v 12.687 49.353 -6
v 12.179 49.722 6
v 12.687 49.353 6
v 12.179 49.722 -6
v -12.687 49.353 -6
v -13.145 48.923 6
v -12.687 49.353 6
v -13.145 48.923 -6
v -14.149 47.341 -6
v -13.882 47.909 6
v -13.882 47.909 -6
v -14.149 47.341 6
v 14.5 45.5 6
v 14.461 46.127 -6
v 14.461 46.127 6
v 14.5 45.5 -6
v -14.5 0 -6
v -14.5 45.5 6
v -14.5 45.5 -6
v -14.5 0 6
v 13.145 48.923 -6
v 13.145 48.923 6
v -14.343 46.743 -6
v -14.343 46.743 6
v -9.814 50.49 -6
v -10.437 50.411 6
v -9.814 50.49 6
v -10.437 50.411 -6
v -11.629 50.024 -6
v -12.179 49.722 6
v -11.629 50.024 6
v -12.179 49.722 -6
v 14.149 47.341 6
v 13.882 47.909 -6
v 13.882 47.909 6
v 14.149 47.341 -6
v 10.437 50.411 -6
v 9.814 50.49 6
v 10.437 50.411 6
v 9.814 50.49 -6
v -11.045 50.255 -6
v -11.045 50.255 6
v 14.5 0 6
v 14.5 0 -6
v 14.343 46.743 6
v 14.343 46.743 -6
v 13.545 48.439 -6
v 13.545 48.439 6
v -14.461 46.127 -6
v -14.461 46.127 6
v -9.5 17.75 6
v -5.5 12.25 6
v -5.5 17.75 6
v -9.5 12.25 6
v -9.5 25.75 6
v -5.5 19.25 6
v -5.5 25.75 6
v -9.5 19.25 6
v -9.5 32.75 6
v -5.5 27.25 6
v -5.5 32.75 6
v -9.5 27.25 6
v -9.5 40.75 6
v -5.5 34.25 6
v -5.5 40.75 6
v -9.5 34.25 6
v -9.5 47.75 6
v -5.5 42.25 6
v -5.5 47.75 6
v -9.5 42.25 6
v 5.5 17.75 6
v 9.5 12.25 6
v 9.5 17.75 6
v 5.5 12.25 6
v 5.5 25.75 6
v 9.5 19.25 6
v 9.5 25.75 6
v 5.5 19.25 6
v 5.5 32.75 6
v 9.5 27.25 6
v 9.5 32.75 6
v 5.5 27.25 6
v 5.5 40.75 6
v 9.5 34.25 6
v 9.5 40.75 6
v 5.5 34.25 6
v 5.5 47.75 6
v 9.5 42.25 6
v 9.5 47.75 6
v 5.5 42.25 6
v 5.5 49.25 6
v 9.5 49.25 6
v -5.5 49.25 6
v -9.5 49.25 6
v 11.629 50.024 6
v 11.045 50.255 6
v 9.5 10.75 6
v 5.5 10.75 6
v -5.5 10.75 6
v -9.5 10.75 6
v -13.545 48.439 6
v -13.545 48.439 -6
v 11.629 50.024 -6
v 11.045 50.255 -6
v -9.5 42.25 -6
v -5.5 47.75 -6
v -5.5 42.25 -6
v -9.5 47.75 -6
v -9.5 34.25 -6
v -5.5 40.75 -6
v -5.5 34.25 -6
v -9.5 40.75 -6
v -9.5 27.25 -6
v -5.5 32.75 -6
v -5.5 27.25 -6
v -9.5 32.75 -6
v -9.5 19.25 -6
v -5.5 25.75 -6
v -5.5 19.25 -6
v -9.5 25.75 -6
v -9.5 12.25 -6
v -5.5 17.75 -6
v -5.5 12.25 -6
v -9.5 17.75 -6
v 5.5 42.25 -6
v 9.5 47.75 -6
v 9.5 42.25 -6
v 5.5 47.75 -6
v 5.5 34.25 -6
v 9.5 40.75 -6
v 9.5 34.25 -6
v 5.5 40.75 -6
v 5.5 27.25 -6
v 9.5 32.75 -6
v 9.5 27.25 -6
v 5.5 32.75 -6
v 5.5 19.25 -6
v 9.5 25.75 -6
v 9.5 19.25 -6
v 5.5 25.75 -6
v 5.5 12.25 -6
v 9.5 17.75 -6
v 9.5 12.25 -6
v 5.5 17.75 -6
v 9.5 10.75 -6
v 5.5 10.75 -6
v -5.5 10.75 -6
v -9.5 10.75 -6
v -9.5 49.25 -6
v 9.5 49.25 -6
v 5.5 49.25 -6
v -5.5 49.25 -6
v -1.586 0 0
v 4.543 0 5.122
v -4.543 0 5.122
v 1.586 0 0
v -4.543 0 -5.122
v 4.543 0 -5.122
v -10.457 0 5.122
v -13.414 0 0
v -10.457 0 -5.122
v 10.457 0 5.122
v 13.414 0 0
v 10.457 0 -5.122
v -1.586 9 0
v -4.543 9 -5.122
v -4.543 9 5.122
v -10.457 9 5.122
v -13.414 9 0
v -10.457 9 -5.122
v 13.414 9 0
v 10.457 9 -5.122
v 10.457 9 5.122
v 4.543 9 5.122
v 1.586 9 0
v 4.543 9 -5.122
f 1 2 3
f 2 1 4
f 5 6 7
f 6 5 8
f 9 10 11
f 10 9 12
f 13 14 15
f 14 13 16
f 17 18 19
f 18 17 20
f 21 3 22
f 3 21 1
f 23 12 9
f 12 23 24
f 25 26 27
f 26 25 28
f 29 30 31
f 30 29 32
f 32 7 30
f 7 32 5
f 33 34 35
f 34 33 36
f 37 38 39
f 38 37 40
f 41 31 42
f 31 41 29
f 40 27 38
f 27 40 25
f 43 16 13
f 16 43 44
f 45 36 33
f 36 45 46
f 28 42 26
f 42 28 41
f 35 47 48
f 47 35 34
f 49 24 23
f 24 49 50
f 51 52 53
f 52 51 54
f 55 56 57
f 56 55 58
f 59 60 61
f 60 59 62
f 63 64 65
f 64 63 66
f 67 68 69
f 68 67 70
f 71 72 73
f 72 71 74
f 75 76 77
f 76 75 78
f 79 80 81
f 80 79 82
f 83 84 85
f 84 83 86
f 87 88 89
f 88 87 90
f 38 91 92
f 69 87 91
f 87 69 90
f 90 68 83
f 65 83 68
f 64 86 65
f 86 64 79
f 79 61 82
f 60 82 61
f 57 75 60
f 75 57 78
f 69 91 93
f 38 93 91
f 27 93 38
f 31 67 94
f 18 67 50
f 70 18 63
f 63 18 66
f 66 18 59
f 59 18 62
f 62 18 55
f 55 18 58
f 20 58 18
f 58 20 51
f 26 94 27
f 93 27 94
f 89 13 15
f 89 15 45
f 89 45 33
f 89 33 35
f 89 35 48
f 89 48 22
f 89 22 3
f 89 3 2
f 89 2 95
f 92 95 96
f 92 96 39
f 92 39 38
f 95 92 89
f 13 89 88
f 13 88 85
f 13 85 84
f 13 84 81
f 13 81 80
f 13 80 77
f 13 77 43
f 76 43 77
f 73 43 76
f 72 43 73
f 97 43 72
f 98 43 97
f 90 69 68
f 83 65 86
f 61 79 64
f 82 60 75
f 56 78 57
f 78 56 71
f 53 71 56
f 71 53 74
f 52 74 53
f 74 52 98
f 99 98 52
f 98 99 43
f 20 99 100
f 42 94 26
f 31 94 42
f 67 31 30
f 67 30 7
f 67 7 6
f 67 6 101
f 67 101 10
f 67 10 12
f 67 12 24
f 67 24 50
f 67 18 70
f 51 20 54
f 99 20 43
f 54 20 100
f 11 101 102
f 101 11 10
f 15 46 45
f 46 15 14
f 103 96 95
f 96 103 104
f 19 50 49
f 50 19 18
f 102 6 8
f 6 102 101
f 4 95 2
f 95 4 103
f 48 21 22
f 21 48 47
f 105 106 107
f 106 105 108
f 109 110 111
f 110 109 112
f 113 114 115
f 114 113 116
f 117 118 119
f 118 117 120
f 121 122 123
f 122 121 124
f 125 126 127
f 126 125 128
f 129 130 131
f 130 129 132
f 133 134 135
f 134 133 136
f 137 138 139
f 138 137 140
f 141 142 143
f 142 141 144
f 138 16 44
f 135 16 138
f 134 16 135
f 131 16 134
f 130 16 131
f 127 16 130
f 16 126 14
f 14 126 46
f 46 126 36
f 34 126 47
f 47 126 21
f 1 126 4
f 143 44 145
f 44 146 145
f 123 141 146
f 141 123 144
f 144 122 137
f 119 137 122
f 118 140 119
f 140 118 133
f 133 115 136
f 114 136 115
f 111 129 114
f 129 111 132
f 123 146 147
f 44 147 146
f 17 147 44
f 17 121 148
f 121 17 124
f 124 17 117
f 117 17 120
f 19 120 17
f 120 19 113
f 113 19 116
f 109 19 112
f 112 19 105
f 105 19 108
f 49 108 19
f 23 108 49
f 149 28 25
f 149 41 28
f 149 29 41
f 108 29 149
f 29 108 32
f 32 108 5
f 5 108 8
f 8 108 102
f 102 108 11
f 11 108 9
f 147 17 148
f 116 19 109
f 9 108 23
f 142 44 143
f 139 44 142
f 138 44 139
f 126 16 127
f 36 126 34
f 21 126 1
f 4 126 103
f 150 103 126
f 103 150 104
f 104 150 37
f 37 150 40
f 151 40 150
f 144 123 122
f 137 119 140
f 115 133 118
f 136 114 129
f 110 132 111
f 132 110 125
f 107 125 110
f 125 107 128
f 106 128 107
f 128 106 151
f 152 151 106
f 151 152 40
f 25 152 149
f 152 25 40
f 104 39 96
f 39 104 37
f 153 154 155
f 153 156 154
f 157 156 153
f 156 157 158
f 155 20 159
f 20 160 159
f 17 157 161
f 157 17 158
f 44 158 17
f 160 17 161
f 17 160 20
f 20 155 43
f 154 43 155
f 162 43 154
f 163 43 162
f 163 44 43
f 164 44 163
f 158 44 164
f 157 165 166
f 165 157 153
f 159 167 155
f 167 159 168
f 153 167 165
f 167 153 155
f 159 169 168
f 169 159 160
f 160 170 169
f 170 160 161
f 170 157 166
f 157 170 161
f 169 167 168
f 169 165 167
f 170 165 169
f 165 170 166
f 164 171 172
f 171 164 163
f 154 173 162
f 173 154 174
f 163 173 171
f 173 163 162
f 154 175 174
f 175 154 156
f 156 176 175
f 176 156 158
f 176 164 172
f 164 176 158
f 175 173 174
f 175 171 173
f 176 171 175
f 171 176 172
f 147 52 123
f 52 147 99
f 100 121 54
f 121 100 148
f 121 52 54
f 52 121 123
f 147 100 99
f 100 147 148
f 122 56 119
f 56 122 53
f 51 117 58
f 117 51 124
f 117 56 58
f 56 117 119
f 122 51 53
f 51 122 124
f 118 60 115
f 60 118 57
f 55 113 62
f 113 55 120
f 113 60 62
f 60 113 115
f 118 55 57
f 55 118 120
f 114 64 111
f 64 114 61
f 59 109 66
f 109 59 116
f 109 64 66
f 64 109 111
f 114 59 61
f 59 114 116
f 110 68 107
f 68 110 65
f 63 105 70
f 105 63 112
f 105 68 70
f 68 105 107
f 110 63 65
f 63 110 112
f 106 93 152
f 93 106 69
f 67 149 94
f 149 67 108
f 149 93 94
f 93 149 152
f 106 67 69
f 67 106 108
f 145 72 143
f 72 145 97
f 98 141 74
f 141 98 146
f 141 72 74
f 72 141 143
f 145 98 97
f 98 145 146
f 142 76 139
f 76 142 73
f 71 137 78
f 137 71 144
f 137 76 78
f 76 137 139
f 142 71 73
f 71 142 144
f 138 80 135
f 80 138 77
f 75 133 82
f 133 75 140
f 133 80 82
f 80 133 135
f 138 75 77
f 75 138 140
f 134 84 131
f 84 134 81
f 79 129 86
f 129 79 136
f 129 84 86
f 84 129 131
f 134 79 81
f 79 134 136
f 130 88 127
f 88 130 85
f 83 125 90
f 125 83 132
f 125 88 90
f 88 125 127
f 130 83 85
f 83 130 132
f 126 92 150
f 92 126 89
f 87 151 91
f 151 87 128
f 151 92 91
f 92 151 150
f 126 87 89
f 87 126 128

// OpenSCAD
$fn = 50;


difference() {
	union() {
		translate(v = [0, 28.5000000000, -6.0000000000]) {
			hull() {
				translate(v = [-9.5000000000, 17.0000000000, 0]) {
					cylinder(h = 12, r = 5);
				}
				translate(v = [9.5000000000, 17.0000000000, 0]) {
					cylinder(h = 12, r = 5);
				}
				translate(v = [-9.5000000000, -17.0000000000, 0]) {
					cylinder(h = 12, r = 5);
				}
				translate(v = [9.5000000000, -17.0000000000, 0]) {
					cylinder(h = 12, r = 5);
				}
			}
		}
		translate(v = [0, 28.5000000000, -6.0000000000]) {
			hull() {
				translate(v = [-9.5000000000, 17.0000000000, 0]) {
					cylinder(h = 12, r = 5);
				}
				translate(v = [9.5000000000, 17.0000000000, 0]) {
					cylinder(h = 12, r = 5);
				}
				translate(v = [-9.5000000000, -17.0000000000, 0]) {
					cylinder(h = 12, r = 5);
				}
				translate(v = [9.5000000000, -17.0000000000, 0]) {
					cylinder(h = 12, r = 5);
				}
			}
		}
		translate(v = [-14.5000000000, 0, -6.0000000000]) {
			cube(size = [29, 13.5000000000, 12]);
		}
	}
	union() {
		translate(v = [-7.5000000000, 9, 0]) {
			rotate(a = [0, 0, 0]) {
				difference() {
					union() {
						rotate(a = [90, 0, 0]) {
							linear_extrude(height = 13.5000000000) {
								polygon(points = [[5.9142500000, 0.0000000000], [2.9571250000, 5.1218907443], [-2.9571250000, 5.1218907443], [-5.9142500000, 0.0000000000], [-2.9571250000, -5.1218907443], [2.9571250000, -5.1218907443]]);
							}
						}
					}
					union();
				}
			}
		}
		translate(v = [7.5000000000, 9, 0]) {
			rotate(a = [0, 0, 0]) {
				difference() {
					union() {
						rotate(a = [90, 0, 0]) {
							linear_extrude(height = 13.5000000000) {
								polygon(points = [[5.9142500000, 0.0000000000], [2.9571250000, 5.1218907443], [-2.9571250000, 5.1218907443], [-5.9142500000, 0.0000000000], [-2.9571250000, -5.1218907443], [2.9571250000, -5.1218907443]]);
							}
						}
					}
					union();
				}
			}
		}
		translate(v = [-9.5000000000, 10.7500000000, -50]) {
			cube(size = [4, 1.5000000000, 100]);
		}
		translate(v = [-9.5000000000, 17.7500000000, -50]) {
			cube(size = [4, 1.5000000000, 100]);
		}
		translate(v = [-9.5000000000, 25.7500000000, -50]) {
			cube(size = [4, 1.5000000000, 100]);
		}
		translate(v = [-9.5000000000, 32.7500000000, -50]) {
			cube(size = [4, 1.5000000000, 100]);
		}
		translate(v = [-9.5000000000, 40.7500000000, -50]) {
			cube(size = [4, 1.5000000000, 100]);
		}
		translate(v = [-9.5000000000, 47.7500000000, -50]) {
			cube(size = [4, 1.5000000000, 100]);
		}
		translate(v = [-7.5000000000, 8, 0]) {
			rotate(a = [90, 0, 0]) {
				cylinder(h = 8, r = 3.2500000000);
			}
		}
		translate(v = [5.5000000000, 10.7500000000, -50]) {
			cube(size = [4, 1.5000000000, 100]);
		}
		translate(v = [5.5000000000, 17.7500000000, -50]) {
			cube(size = [4, 1.5000000000, 100]);
		}
		translate(v = [5.5000000000, 25.7500000000, -50]) {
			cube(size = [4, 1.5000000000, 100]);
		}
		translate(v = [5.5000000000, 32.7500000000, -50]) {
			cube(size = [4, 1.5000000000, 100]);
		}
		translate(v = [5.5000000000, 40.7500000000, -50]) {
			cube(size = [4, 1.5000000000, 100]);
		}
		translate(v = [5.5000000000, 47.7500000000, -50]) {
			cube(size = [4, 1.5000000000, 100]);
		}
		translate(v = [7.5000000000, 8, 0]) {
			rotate(a = [90, 0, 0]) {
				cylinder(h = 8, r = 3.2500000000);
			}
		}
	}
}
